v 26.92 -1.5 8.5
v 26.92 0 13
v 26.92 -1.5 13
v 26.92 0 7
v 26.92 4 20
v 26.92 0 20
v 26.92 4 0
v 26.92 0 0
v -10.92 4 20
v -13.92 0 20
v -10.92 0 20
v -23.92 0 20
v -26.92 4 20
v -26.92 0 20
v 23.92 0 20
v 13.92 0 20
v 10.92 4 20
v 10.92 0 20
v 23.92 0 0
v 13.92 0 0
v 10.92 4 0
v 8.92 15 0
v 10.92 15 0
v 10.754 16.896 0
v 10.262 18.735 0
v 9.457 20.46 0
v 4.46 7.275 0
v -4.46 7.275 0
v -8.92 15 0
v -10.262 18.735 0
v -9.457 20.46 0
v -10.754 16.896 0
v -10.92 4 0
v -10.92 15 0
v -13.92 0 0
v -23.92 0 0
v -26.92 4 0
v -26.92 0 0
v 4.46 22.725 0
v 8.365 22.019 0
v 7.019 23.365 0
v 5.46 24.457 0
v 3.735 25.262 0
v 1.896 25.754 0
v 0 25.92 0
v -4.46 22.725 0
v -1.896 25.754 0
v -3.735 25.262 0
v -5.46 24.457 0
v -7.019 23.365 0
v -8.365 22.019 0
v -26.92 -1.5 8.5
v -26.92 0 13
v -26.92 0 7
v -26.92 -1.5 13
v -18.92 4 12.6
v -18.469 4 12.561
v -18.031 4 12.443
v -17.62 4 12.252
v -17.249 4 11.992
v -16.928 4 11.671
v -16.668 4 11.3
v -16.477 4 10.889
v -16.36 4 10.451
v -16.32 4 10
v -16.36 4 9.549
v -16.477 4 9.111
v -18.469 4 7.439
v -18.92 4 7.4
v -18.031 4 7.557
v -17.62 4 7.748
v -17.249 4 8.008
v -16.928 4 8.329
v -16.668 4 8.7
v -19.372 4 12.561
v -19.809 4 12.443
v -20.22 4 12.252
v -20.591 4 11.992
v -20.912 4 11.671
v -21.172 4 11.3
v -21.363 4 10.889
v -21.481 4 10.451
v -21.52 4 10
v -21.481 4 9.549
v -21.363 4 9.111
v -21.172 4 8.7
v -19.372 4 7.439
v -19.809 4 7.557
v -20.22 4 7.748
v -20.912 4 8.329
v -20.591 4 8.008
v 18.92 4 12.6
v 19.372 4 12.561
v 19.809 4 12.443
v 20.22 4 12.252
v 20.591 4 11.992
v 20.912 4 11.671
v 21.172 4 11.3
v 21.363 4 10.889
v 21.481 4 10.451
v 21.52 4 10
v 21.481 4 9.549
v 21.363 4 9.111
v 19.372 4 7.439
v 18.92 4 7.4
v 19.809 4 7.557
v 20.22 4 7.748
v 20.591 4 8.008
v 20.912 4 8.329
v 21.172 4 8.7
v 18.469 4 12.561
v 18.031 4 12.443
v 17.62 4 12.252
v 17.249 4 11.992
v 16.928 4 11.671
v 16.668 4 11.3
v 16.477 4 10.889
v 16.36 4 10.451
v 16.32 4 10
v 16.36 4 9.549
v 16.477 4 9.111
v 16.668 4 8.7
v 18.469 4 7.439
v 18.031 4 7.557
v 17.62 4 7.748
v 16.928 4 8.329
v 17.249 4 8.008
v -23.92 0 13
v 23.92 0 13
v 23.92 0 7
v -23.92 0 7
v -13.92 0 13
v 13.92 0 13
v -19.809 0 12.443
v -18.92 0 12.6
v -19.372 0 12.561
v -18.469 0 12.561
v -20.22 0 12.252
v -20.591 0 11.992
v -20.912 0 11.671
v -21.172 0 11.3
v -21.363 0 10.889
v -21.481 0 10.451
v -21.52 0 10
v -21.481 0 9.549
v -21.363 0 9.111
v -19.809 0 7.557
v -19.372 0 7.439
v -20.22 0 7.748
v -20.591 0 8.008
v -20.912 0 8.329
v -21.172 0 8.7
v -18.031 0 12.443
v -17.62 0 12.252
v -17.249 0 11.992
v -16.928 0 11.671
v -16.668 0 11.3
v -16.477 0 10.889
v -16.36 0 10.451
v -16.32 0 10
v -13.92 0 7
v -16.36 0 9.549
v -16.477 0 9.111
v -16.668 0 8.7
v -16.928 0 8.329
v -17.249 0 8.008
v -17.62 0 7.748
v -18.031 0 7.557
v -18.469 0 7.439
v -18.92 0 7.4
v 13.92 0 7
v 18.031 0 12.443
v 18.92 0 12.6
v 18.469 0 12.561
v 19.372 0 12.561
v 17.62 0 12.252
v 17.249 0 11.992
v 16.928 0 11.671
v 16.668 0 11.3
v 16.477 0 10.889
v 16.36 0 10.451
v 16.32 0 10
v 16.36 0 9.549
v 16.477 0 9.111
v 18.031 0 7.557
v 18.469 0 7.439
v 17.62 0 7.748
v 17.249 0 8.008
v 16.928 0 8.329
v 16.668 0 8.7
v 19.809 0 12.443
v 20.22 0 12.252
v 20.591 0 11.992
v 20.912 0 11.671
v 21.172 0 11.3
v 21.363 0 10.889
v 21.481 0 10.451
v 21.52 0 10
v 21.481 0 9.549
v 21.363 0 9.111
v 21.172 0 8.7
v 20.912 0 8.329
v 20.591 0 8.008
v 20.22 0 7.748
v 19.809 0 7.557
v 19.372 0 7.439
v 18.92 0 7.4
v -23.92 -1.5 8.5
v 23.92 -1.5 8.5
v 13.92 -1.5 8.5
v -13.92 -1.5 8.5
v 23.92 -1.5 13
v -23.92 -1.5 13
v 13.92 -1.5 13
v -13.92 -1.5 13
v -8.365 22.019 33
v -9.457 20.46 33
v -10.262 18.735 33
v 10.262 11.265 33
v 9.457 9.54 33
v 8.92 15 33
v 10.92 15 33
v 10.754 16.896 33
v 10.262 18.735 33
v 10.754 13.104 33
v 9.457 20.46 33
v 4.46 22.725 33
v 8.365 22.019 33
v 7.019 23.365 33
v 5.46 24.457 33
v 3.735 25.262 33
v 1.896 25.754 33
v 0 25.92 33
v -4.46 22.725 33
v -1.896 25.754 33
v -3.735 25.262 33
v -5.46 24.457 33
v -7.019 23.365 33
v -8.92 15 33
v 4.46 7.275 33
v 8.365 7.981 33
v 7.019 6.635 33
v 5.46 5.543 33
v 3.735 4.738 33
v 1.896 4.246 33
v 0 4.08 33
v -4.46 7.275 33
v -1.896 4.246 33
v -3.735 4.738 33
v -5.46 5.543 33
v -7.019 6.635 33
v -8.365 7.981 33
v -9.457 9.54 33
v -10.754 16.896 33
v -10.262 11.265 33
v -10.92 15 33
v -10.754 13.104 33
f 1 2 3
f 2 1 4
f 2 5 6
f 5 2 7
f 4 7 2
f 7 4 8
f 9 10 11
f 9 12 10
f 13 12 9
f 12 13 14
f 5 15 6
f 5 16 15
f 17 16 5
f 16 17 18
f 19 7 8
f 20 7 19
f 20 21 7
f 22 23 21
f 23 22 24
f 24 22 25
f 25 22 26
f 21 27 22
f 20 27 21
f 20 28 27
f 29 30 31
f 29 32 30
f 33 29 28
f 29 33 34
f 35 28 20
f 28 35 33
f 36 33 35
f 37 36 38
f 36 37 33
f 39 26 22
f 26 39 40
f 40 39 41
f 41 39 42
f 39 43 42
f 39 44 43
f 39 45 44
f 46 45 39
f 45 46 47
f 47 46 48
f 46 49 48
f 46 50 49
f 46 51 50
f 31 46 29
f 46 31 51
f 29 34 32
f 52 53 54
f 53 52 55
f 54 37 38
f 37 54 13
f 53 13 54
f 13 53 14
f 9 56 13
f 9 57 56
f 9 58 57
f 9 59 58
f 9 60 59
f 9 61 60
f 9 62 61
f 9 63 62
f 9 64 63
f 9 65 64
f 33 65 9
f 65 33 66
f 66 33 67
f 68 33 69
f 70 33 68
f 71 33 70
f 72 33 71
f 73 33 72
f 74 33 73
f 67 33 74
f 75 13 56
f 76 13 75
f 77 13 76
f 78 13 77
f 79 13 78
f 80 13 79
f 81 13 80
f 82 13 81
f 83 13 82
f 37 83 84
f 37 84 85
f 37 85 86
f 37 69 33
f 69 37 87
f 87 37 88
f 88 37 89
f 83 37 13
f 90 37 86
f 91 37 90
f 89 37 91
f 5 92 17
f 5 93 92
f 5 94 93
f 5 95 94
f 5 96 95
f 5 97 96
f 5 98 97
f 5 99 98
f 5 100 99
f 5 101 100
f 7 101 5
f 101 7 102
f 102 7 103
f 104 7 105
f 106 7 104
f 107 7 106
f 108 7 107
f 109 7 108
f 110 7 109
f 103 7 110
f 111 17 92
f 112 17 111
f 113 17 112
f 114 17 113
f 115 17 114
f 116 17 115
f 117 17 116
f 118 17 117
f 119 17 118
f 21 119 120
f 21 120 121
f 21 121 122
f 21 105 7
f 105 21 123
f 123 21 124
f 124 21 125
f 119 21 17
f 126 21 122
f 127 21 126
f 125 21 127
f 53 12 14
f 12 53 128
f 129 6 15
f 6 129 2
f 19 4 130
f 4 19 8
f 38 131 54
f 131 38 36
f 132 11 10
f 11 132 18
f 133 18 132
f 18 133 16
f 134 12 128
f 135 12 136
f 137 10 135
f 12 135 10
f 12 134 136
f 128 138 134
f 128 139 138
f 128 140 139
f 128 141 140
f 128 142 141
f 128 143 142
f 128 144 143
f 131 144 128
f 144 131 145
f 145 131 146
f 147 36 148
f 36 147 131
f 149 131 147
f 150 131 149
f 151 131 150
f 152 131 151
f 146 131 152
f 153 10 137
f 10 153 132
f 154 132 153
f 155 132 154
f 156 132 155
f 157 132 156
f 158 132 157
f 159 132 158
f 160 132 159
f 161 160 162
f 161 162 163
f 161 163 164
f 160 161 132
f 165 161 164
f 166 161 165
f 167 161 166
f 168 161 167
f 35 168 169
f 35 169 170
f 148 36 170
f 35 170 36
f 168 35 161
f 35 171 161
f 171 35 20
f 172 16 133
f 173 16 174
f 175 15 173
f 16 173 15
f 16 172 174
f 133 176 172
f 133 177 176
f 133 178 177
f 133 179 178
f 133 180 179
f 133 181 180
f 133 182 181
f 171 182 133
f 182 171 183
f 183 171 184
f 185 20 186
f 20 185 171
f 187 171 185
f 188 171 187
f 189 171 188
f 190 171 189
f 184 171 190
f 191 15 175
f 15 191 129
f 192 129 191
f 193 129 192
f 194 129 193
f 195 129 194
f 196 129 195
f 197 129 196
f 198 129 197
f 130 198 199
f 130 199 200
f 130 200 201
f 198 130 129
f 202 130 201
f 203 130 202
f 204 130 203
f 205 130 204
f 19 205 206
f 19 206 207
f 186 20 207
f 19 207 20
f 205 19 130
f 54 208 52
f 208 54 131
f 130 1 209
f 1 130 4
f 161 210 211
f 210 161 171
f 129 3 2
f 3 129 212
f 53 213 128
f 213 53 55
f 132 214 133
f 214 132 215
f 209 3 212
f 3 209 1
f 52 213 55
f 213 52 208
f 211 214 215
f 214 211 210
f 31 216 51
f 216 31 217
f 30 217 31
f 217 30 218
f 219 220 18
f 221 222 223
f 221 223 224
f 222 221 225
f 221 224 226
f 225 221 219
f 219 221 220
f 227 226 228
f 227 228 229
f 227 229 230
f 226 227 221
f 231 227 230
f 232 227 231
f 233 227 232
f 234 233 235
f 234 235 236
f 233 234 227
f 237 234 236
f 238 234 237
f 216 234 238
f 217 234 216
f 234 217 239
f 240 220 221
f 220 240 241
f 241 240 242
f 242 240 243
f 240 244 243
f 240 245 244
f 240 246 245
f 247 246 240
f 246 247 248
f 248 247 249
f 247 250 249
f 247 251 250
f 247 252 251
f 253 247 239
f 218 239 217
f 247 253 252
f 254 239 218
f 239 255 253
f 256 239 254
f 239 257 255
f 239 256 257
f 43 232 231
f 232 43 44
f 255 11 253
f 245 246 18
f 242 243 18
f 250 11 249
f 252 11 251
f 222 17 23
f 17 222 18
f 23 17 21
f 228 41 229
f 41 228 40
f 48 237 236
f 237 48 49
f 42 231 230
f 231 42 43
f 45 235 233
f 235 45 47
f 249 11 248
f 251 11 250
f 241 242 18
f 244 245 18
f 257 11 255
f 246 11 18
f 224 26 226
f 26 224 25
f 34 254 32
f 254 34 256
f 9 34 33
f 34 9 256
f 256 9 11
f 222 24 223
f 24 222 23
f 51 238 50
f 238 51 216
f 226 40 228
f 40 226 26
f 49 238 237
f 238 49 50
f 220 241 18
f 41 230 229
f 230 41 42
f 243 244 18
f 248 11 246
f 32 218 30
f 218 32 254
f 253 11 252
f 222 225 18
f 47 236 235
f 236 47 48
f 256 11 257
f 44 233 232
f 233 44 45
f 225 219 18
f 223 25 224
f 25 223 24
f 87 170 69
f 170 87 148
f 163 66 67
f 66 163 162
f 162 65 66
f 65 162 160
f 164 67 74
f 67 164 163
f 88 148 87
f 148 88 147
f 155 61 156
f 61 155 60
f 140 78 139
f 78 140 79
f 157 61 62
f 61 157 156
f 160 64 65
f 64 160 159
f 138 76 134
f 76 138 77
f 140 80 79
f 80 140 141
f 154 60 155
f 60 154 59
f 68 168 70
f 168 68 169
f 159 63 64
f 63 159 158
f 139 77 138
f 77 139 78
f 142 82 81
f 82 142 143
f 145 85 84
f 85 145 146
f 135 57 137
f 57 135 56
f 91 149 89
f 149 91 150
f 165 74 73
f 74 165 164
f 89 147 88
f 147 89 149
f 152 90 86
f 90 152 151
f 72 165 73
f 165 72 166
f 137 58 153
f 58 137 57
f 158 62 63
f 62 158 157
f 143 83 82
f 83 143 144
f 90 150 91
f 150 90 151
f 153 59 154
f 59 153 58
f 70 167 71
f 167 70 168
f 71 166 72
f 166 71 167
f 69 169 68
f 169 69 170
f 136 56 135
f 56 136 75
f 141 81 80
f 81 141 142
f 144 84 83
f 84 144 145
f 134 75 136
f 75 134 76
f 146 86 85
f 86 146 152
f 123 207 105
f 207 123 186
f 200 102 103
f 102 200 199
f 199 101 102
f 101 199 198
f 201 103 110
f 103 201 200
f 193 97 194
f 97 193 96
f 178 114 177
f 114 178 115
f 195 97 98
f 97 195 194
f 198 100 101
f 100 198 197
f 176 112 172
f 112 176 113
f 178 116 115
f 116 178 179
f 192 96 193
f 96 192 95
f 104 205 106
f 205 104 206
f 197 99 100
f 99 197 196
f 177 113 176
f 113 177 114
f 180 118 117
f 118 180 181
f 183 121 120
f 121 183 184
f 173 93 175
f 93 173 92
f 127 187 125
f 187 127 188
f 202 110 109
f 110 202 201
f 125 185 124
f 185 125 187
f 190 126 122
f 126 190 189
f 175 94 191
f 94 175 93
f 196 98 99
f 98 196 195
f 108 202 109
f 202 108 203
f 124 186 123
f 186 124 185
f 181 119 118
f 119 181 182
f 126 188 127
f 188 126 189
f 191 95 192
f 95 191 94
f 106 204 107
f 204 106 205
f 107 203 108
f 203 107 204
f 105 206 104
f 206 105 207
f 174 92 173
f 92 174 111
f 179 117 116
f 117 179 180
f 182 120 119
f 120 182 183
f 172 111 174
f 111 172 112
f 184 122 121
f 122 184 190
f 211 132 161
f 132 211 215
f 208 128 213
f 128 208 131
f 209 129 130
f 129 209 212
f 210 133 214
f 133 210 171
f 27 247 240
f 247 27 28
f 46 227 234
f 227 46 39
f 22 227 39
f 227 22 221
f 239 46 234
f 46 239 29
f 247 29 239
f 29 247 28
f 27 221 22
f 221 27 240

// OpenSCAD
//3D printer LM8LUU bracket for 2020 extrusion
//2017, John Stäck (john@stack.se)
//Licensed under Creative Commons Attribution Share-Alike (CC BY-SA 3.0)

$fn=36;

rail_height=20; //2020 rail
slot_width=6;
notch_depth=1.5;
rail_screw_diameter=5.2; //M5 + margin

slot_nut_length=10;

//LM8LUU linear bearing
bearing_diameter=15;
//bearing_height=45; //Full LM8LUU bearing
bearing_height=33; //Only covers part between "notches". Make as long as you wish.

bearing_margin=0.45; //Increase in diameter due to printer behaviour. Make test pieces for a snug fit.

bearing_hole_sides=6;

bearing_hole_inscribed=(bearing_diameter+bearing_margin)/cos(180/bearing_hole_sides);

echo(bearing_hole_inscribed);

bearing_holder_diameter=bearing_hole_inscribed+4;
axle_offset=15; //Distance from face of bracket to center of bearing/axle. Determined by z-nut bracket


bracket_width=26;
endplate_thickness=0;
bracket_thickness=4;
e=0.01;
hole_inset=8; //distance from edge of bracket to mounting hole
bracket_length=bearing_holder_diameter+hole_inset*4;

difference() {
    union() {
        
       //Base parts of bracket
       translate([-bracket_length/2,0,0]) {
           cube([bracket_length, bracket_thickness, rail_height]);

       }
       
       
       //Notch into rail
       notch_points=[[0,-slot_width/2],[notch_depth,-slot_width/2+notch_depth],[notch_depth,slot_width/2],[0,slot_width/2]];
       notch_path=[[0,1,2,3,0]];
       
       translate([bracket_length/2+endplate_thickness,0,rail_height/2]) rotate([90,0,-90])  linear_extrude(height=bracket_length+endplate_thickness*2) polygon(points=notch_points, paths=notch_path, convexity=2);
       
       //Linear bearing holder
       hull() {
       translate([0,axle_offset,0]) {
           cylinder(d=bearing_holder_diameter,h=bearing_height);
       }
       
       //Make it beefier
       translate([-bearing_holder_diameter/2,0,0]) cube([bearing_holder_diameter, axle_offset, rail_height]);
       }
    }
    
    union() {
        //Holes for mounting bolts to rail
        for(i=[-1,1])
            translate([i*(bracket_length/2-hole_inset), -e, rail_height/2]) rotate([-90,0,0]) cylinder(d=rail_screw_diameter, h=bracket_thickness+2*e);
        
        //Cutout in notch for slot nuts
         for(i=[-1,1])
            translate([i*(bracket_length/2-hole_inset)-slot_nut_length/2,-notch_depth-e,0]) cube([slot_nut_length,notch_depth+e,rail_height]);
        
        //Linear bearing holder
        translate([0,axle_offset,-e]) {
            cylinder(d=bearing_hole_inscribed, $fn=bearing_hole_sides, h=bearing_height+2*e);
        }
        
    }
}
